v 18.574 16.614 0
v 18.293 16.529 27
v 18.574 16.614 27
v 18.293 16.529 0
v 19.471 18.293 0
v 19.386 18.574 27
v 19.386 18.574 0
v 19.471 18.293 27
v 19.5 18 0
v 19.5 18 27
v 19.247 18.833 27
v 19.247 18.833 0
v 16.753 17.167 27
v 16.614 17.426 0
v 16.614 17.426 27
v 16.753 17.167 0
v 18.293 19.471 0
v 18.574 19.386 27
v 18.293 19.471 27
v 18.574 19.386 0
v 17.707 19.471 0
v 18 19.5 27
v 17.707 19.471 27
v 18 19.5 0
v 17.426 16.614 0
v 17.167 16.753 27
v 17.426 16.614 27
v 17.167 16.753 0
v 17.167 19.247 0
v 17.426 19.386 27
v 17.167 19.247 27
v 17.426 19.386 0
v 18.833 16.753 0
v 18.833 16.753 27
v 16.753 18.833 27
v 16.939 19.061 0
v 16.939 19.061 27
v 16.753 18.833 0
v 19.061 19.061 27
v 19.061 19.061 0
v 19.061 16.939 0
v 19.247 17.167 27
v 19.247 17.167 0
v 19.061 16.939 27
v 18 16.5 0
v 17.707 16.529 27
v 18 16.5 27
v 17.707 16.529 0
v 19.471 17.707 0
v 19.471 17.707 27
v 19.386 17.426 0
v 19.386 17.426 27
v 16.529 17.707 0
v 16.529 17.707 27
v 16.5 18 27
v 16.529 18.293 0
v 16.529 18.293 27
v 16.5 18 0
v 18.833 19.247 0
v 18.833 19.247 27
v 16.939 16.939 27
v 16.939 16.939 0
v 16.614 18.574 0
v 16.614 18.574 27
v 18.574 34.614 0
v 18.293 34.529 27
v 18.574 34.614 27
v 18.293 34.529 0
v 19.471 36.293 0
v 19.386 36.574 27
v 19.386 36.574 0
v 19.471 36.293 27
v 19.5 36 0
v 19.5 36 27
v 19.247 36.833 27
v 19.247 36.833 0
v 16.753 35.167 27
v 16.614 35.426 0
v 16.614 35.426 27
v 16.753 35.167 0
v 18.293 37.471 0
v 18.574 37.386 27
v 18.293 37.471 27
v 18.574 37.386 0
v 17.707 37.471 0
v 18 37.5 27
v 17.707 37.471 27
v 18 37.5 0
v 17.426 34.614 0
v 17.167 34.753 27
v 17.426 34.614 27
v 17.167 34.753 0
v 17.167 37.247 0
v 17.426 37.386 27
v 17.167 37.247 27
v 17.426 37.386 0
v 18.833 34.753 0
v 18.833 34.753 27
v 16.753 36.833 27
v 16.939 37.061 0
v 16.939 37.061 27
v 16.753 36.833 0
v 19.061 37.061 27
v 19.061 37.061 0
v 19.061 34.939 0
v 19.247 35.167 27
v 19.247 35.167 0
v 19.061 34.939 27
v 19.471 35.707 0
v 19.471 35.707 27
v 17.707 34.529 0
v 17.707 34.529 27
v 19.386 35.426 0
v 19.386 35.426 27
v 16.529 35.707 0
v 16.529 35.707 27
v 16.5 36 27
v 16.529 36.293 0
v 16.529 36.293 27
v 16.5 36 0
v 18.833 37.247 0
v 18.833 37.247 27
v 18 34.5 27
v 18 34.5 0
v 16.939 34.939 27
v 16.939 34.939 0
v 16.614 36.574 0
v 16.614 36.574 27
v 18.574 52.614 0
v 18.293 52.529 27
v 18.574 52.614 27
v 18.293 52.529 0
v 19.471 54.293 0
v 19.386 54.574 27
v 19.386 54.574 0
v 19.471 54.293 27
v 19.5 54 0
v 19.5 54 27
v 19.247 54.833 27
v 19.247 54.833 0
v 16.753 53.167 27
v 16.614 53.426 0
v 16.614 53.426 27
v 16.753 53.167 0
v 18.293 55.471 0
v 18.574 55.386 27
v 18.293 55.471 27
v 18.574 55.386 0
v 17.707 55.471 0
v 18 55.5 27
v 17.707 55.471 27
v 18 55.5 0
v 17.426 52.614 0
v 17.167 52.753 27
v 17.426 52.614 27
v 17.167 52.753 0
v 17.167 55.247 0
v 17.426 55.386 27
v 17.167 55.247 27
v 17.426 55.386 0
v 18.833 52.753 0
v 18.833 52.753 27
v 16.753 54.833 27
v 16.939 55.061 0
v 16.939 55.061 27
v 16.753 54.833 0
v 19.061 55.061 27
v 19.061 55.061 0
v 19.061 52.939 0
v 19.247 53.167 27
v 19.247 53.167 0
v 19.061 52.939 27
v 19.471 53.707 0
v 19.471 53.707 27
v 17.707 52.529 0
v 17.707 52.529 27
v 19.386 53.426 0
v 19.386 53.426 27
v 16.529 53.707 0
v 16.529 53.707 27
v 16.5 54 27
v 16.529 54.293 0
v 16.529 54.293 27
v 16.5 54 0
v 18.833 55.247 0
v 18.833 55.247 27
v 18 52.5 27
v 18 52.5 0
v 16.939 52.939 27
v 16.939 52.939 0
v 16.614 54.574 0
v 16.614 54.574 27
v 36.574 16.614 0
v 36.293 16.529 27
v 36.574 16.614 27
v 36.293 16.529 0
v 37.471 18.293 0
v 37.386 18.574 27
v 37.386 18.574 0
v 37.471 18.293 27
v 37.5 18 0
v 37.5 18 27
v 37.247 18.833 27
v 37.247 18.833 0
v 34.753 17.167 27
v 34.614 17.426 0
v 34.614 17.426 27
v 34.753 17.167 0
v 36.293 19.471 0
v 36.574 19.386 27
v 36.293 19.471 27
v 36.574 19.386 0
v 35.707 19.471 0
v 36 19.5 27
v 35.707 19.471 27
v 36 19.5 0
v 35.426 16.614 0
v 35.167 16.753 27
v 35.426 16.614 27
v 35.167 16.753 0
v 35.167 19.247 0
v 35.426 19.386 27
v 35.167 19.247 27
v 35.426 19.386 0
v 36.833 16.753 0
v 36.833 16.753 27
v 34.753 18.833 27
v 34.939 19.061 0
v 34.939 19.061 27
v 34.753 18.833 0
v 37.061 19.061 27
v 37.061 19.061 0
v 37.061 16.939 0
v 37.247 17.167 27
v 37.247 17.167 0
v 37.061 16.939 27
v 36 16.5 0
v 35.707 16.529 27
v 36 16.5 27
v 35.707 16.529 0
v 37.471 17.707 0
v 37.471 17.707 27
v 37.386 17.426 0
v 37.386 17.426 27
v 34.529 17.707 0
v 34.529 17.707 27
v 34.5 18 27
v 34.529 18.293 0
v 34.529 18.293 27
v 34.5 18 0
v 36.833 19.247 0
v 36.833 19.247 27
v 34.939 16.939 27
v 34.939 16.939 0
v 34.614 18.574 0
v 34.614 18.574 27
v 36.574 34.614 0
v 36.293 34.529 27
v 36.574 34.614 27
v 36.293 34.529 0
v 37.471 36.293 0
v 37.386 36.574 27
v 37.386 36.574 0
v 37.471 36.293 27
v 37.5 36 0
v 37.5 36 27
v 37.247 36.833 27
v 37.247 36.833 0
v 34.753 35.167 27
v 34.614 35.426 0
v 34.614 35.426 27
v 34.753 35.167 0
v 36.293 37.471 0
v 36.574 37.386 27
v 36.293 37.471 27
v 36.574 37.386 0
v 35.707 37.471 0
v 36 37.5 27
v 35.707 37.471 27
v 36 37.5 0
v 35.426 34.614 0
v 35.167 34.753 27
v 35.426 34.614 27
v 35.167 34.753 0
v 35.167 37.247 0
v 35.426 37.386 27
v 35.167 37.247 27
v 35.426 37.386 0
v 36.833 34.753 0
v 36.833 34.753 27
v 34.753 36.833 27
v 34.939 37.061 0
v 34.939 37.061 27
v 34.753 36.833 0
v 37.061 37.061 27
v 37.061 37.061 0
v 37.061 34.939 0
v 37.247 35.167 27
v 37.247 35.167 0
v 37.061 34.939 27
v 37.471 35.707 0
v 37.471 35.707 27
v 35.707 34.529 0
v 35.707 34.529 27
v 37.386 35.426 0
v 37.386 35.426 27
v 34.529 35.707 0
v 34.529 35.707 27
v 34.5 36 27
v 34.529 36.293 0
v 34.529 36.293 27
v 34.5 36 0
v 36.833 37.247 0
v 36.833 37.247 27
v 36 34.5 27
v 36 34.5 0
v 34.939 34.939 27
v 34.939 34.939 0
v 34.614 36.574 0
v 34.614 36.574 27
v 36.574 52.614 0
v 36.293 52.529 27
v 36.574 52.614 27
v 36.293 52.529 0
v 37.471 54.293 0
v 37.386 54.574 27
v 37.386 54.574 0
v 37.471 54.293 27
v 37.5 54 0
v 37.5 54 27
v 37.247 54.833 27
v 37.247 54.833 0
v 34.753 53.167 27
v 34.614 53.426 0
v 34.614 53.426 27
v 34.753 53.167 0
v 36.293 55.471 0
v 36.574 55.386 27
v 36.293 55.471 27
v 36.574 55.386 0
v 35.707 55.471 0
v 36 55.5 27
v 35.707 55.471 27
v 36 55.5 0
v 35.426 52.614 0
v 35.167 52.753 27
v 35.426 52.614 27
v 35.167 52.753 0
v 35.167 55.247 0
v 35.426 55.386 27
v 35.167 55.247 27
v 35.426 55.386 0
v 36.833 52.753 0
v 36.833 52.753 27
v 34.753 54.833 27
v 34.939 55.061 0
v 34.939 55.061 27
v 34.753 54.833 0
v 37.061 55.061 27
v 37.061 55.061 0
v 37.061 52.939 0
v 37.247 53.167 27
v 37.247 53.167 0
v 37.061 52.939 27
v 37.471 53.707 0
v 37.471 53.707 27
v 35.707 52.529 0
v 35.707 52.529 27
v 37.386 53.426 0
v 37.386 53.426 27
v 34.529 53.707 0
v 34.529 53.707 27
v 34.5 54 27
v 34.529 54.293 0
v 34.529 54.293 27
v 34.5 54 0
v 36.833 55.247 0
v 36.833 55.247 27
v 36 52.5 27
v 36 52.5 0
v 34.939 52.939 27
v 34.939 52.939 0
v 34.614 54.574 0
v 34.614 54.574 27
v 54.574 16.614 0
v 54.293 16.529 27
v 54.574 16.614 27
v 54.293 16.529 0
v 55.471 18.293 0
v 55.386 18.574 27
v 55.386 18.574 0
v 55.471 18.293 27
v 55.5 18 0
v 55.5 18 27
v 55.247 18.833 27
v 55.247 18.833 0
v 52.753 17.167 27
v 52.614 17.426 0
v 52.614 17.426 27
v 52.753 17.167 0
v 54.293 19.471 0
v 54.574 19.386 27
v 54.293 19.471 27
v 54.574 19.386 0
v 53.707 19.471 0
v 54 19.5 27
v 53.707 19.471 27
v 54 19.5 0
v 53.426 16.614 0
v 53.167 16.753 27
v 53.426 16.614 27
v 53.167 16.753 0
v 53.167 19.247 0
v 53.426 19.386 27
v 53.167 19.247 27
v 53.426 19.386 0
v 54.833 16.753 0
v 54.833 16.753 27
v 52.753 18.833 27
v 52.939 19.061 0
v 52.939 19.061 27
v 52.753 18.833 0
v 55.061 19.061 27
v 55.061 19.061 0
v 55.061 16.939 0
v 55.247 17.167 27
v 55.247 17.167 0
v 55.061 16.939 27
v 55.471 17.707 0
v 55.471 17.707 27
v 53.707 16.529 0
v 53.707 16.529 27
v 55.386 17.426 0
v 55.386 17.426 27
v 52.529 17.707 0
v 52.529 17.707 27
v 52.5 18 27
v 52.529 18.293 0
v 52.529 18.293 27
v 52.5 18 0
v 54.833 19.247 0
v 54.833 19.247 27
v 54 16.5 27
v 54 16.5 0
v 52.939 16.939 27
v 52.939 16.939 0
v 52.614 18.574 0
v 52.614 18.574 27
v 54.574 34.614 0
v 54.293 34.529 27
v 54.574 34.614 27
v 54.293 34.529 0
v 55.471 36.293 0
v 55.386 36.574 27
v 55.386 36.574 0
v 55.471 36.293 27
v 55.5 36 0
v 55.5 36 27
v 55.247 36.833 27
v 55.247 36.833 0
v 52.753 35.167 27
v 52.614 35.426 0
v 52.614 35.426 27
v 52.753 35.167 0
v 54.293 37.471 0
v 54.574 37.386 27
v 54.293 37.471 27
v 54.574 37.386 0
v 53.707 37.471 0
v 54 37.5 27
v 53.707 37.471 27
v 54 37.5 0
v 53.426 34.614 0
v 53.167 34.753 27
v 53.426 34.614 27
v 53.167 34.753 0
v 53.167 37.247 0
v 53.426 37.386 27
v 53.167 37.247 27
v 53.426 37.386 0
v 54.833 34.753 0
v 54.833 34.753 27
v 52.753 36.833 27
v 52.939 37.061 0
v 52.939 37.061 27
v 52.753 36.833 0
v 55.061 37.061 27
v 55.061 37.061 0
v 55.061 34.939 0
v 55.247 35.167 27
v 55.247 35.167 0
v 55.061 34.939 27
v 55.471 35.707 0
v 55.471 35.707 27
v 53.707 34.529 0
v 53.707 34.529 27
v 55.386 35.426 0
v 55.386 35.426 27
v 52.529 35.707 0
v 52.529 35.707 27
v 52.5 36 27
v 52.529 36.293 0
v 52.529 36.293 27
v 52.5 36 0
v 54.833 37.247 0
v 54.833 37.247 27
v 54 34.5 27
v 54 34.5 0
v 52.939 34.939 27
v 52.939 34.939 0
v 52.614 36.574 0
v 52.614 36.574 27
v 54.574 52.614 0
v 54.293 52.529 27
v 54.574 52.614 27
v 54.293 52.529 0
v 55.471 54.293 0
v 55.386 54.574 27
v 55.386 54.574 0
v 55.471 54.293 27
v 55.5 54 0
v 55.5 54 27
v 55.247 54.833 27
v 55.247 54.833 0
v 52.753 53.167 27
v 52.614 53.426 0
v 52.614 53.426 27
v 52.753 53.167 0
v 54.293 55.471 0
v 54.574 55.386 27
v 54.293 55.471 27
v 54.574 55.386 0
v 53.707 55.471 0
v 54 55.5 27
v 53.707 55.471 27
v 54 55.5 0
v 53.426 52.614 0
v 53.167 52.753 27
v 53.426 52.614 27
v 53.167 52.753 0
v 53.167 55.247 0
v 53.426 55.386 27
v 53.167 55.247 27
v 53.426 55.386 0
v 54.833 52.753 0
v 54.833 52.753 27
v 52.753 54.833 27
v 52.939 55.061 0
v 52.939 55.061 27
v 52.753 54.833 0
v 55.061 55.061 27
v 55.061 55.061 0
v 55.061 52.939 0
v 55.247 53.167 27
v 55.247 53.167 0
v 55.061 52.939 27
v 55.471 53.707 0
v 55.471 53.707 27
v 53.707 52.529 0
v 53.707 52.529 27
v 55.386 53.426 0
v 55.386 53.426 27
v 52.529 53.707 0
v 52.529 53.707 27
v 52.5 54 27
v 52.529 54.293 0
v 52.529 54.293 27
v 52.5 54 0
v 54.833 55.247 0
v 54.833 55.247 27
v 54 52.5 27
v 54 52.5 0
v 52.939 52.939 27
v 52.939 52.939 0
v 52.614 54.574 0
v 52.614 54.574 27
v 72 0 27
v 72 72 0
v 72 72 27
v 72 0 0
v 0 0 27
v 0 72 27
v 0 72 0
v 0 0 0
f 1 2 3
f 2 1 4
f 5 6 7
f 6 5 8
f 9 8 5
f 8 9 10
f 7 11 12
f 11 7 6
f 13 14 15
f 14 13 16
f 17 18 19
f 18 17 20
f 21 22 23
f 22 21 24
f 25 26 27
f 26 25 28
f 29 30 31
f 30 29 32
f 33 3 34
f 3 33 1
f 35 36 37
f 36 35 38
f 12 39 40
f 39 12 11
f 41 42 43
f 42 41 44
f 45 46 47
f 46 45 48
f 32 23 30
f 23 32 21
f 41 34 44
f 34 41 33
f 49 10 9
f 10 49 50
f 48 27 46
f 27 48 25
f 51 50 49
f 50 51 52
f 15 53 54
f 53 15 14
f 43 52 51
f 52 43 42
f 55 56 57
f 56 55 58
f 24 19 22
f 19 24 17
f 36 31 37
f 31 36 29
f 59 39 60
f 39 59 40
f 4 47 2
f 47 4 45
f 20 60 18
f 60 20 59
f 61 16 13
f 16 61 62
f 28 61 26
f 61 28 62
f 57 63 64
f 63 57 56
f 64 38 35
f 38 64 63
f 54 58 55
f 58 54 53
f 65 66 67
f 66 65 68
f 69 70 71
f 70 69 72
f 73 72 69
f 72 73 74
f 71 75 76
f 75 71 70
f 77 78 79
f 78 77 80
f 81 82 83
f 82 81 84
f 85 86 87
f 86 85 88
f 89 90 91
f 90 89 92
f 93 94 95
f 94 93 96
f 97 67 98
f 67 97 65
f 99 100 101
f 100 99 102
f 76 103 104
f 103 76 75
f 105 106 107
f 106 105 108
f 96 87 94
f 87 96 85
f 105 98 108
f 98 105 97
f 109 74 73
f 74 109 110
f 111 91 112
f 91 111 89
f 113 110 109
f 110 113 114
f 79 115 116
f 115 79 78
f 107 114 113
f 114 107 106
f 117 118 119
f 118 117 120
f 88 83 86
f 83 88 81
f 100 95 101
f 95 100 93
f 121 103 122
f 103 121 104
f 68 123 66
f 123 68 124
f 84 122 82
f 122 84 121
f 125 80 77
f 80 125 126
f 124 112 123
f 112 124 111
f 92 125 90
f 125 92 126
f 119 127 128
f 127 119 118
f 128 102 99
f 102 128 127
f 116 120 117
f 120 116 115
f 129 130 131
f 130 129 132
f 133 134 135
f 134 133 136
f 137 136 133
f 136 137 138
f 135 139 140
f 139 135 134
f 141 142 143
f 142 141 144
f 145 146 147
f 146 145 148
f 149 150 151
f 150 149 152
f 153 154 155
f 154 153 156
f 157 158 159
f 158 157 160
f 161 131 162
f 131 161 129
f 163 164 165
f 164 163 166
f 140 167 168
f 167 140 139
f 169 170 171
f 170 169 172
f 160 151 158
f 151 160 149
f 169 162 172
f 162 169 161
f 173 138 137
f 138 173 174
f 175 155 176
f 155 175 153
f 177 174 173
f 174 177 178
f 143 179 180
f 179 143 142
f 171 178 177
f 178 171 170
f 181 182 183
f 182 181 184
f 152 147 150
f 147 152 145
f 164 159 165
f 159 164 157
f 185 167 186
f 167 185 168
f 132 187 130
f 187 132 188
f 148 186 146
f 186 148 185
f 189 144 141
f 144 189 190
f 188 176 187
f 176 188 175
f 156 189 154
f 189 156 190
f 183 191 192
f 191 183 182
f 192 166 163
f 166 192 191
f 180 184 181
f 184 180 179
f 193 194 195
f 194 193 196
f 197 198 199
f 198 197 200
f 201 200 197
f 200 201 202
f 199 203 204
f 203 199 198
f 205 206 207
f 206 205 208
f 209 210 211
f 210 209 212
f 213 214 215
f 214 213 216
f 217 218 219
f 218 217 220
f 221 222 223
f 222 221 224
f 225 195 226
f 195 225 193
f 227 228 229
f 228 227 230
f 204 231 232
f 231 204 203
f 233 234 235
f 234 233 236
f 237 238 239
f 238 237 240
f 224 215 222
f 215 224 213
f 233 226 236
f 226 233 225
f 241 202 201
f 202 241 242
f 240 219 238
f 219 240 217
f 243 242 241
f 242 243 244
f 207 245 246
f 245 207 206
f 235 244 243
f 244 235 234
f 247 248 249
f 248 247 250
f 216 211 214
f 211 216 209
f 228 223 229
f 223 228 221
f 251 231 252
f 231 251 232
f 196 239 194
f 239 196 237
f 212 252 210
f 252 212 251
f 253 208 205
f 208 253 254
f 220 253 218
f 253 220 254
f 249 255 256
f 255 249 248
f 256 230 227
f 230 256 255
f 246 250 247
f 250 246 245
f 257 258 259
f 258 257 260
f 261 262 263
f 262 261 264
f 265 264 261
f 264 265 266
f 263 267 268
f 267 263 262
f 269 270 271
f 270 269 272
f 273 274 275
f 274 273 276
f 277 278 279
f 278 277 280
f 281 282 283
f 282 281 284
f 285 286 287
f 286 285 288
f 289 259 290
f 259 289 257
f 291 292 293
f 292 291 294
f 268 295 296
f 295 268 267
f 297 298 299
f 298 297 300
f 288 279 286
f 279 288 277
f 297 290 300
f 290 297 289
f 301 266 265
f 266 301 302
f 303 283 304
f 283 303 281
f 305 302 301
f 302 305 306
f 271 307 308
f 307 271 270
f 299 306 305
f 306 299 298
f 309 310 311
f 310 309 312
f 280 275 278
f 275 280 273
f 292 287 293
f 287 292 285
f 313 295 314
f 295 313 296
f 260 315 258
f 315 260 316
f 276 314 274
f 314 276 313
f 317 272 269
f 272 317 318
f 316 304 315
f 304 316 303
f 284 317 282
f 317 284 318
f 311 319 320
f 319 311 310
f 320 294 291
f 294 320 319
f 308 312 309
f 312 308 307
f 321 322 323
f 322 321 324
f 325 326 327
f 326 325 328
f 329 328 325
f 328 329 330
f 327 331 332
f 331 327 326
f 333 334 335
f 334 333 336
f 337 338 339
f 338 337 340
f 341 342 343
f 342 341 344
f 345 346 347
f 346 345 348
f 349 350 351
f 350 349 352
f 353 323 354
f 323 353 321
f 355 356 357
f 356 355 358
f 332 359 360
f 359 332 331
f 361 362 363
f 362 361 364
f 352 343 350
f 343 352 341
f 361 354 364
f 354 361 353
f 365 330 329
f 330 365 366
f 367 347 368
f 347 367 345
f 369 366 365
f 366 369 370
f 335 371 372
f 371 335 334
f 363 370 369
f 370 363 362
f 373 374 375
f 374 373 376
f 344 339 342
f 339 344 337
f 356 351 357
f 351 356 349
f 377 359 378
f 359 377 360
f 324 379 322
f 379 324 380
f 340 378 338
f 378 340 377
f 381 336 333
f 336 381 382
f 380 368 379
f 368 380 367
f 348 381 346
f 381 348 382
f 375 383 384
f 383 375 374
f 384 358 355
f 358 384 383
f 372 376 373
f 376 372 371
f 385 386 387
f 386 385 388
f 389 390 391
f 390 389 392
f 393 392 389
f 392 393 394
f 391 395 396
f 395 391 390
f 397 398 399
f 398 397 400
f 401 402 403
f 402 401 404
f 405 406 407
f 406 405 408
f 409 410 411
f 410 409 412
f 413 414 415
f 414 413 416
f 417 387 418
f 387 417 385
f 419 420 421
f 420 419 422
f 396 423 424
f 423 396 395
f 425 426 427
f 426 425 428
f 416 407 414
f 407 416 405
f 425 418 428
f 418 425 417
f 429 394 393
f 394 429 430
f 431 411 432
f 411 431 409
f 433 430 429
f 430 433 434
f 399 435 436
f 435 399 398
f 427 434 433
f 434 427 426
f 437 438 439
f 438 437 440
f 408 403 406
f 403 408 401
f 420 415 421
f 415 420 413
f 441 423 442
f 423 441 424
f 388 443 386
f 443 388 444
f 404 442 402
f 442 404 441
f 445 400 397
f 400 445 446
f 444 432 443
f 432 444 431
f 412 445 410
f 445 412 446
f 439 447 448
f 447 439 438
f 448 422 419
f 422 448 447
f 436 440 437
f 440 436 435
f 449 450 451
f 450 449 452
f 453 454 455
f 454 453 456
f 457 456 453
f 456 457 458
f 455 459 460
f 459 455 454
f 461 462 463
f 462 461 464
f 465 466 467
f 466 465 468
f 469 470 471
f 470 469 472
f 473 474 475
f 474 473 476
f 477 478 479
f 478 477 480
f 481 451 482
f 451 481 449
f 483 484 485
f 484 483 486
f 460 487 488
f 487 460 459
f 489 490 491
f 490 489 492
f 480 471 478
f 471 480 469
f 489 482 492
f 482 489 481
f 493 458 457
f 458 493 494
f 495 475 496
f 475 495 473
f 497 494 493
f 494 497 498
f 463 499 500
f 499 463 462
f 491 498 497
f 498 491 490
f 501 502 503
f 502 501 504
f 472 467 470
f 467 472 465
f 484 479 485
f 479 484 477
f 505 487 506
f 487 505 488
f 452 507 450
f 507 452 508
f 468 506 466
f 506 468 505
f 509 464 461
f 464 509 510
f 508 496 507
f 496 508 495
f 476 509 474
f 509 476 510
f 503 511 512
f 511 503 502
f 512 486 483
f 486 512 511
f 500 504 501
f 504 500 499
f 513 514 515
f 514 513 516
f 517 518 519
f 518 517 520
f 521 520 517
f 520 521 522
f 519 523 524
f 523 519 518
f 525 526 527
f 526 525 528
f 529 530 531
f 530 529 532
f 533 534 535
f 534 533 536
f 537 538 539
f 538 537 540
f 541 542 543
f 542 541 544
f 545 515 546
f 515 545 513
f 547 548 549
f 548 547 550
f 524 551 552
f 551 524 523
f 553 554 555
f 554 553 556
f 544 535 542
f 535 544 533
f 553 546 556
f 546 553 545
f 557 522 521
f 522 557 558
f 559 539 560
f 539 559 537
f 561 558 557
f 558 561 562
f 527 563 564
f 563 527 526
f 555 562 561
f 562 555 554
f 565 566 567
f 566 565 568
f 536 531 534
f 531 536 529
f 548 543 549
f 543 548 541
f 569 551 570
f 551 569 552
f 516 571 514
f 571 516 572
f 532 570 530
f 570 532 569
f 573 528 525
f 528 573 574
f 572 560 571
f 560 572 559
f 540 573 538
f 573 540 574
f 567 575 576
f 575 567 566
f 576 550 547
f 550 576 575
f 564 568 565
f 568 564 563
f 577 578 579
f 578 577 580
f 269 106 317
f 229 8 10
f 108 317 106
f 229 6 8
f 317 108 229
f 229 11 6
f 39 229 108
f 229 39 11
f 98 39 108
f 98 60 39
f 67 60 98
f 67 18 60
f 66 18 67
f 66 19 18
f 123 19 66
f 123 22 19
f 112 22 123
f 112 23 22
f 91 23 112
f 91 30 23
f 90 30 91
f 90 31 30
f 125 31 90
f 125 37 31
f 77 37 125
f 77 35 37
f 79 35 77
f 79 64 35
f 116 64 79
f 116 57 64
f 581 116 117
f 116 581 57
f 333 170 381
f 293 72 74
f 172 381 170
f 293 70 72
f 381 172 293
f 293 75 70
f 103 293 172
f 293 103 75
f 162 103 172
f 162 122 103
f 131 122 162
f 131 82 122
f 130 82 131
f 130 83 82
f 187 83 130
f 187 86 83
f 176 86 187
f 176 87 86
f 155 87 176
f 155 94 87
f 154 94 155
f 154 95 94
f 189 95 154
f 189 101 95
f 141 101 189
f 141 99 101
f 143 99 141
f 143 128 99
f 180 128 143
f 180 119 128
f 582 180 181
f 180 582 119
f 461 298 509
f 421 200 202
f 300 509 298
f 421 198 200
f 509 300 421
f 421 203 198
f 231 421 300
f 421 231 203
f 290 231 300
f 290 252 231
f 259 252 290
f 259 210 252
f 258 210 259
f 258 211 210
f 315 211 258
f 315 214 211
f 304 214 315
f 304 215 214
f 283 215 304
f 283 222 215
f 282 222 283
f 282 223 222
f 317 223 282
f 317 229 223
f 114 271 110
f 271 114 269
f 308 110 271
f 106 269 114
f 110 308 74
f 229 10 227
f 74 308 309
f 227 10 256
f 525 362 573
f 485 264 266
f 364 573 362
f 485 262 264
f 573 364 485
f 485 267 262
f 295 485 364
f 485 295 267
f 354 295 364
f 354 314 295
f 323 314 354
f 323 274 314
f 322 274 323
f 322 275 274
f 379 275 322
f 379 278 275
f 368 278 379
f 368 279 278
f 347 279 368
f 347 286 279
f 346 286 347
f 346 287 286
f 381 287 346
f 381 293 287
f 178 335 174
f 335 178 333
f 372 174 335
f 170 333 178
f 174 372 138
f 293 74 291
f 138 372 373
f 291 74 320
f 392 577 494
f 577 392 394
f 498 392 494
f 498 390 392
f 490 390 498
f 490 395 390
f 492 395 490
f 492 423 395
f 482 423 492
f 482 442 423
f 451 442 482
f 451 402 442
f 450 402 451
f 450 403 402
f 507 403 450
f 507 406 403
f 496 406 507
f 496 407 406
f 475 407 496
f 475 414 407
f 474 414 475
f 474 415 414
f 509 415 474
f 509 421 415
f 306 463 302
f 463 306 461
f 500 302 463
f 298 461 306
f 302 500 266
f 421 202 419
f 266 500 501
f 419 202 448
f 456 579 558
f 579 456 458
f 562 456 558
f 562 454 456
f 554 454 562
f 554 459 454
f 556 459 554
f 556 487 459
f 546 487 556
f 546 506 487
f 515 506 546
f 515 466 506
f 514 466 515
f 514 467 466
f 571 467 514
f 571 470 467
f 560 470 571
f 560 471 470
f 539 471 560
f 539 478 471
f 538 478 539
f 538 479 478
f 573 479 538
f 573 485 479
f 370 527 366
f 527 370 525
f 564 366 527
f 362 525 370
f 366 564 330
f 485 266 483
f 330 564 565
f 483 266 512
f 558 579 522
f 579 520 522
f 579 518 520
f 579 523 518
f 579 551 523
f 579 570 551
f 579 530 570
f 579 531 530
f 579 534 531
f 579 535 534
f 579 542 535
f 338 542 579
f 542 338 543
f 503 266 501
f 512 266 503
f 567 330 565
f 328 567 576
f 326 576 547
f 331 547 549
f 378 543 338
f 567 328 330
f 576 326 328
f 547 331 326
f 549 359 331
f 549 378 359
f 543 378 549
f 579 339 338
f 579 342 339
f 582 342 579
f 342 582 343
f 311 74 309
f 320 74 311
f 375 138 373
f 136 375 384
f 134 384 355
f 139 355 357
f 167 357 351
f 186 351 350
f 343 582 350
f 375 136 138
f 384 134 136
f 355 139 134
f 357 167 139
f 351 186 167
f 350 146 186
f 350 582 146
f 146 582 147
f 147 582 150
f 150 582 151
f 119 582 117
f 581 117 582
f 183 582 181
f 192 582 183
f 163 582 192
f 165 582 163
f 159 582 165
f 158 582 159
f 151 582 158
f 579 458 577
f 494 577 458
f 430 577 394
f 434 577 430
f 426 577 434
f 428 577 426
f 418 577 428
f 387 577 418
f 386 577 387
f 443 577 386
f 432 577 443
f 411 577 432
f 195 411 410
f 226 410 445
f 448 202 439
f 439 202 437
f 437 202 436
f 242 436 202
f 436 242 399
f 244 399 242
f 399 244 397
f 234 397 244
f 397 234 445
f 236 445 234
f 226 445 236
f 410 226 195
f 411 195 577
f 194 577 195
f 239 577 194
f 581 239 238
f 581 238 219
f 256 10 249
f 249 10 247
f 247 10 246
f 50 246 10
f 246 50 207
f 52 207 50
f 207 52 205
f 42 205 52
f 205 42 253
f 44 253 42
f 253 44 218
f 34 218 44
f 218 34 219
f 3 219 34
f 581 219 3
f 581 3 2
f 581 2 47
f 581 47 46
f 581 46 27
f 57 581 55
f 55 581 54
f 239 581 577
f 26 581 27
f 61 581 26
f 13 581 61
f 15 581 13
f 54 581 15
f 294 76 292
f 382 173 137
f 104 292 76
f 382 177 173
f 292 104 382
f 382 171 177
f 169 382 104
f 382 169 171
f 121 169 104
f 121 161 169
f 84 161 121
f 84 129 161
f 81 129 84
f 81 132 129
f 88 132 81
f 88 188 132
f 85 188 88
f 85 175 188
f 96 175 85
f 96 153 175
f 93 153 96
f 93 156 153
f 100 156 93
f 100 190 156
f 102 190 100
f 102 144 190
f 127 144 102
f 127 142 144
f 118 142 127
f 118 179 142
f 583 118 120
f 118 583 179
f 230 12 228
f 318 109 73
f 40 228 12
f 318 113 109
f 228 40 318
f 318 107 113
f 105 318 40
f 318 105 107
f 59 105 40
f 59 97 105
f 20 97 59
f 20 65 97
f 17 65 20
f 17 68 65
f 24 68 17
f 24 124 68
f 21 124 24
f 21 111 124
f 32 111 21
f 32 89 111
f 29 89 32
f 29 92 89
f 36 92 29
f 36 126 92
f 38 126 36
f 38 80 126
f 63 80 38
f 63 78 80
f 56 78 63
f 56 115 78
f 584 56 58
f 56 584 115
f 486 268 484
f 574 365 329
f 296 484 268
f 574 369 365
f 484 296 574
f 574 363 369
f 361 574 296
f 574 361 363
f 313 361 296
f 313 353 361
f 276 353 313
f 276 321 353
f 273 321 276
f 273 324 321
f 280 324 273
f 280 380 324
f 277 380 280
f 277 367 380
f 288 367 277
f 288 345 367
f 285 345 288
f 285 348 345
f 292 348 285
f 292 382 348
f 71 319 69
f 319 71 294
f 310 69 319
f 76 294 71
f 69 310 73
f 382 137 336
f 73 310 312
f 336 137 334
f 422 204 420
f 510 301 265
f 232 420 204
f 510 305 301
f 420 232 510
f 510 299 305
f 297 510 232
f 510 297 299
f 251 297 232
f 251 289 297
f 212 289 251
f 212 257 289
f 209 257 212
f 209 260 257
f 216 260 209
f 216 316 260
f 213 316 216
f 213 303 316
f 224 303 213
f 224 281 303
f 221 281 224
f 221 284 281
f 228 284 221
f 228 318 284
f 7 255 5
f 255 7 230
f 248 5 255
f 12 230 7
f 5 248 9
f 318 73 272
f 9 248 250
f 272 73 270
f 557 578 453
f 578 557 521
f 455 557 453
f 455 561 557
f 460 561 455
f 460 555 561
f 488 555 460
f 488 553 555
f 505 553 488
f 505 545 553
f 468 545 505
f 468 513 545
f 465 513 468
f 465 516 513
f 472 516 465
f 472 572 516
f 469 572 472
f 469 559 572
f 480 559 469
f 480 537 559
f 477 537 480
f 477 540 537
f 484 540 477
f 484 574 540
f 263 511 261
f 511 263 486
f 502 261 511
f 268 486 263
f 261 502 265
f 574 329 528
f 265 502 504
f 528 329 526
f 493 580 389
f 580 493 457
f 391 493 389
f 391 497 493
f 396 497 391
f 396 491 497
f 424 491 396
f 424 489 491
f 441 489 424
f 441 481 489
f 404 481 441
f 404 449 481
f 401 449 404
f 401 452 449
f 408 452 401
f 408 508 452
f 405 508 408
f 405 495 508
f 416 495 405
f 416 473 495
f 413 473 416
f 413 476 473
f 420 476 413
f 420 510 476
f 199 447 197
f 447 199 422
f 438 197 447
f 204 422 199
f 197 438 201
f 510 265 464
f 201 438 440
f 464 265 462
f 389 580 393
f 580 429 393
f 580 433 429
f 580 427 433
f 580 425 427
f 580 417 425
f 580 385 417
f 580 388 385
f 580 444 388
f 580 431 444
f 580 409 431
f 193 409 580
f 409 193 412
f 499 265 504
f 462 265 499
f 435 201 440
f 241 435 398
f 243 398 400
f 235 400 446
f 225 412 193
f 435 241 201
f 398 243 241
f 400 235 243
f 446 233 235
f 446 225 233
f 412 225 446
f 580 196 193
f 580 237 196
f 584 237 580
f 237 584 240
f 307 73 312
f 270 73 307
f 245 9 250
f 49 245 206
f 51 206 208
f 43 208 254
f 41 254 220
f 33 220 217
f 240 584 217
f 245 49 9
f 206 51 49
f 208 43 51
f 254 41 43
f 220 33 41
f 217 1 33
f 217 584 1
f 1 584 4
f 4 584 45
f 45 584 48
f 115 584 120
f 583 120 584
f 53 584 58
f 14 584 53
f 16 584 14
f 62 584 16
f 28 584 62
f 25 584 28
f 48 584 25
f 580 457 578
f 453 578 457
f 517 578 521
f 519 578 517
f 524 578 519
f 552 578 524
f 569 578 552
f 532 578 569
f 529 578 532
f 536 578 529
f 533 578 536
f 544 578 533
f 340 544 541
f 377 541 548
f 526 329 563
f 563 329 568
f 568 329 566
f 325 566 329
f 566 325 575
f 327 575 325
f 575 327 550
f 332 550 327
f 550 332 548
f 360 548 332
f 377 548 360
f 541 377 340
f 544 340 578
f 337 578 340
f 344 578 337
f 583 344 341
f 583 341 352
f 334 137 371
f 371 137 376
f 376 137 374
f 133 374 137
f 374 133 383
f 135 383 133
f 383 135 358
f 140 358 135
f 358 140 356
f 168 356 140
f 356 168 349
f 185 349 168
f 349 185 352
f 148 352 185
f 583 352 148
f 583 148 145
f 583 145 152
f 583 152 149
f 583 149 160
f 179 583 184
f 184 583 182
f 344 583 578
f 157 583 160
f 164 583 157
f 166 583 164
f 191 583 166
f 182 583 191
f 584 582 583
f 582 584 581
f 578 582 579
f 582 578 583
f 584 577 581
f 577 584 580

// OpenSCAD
$fn = 32;

tip_d = 3;
tip_h = 27;
spacing = 18;

cols = 3;
rows = 3;

difference() {
  cube([(rows + 1) * spacing, (cols + 1) * spacing, tip_h]);
  for (col = [1:cols]) {
    for (row = [1:rows]) {
      translate([col * spacing, row * spacing, -1])
        cylinder(h = tip_h + 2, d = tip_d);
    }
  }
}
